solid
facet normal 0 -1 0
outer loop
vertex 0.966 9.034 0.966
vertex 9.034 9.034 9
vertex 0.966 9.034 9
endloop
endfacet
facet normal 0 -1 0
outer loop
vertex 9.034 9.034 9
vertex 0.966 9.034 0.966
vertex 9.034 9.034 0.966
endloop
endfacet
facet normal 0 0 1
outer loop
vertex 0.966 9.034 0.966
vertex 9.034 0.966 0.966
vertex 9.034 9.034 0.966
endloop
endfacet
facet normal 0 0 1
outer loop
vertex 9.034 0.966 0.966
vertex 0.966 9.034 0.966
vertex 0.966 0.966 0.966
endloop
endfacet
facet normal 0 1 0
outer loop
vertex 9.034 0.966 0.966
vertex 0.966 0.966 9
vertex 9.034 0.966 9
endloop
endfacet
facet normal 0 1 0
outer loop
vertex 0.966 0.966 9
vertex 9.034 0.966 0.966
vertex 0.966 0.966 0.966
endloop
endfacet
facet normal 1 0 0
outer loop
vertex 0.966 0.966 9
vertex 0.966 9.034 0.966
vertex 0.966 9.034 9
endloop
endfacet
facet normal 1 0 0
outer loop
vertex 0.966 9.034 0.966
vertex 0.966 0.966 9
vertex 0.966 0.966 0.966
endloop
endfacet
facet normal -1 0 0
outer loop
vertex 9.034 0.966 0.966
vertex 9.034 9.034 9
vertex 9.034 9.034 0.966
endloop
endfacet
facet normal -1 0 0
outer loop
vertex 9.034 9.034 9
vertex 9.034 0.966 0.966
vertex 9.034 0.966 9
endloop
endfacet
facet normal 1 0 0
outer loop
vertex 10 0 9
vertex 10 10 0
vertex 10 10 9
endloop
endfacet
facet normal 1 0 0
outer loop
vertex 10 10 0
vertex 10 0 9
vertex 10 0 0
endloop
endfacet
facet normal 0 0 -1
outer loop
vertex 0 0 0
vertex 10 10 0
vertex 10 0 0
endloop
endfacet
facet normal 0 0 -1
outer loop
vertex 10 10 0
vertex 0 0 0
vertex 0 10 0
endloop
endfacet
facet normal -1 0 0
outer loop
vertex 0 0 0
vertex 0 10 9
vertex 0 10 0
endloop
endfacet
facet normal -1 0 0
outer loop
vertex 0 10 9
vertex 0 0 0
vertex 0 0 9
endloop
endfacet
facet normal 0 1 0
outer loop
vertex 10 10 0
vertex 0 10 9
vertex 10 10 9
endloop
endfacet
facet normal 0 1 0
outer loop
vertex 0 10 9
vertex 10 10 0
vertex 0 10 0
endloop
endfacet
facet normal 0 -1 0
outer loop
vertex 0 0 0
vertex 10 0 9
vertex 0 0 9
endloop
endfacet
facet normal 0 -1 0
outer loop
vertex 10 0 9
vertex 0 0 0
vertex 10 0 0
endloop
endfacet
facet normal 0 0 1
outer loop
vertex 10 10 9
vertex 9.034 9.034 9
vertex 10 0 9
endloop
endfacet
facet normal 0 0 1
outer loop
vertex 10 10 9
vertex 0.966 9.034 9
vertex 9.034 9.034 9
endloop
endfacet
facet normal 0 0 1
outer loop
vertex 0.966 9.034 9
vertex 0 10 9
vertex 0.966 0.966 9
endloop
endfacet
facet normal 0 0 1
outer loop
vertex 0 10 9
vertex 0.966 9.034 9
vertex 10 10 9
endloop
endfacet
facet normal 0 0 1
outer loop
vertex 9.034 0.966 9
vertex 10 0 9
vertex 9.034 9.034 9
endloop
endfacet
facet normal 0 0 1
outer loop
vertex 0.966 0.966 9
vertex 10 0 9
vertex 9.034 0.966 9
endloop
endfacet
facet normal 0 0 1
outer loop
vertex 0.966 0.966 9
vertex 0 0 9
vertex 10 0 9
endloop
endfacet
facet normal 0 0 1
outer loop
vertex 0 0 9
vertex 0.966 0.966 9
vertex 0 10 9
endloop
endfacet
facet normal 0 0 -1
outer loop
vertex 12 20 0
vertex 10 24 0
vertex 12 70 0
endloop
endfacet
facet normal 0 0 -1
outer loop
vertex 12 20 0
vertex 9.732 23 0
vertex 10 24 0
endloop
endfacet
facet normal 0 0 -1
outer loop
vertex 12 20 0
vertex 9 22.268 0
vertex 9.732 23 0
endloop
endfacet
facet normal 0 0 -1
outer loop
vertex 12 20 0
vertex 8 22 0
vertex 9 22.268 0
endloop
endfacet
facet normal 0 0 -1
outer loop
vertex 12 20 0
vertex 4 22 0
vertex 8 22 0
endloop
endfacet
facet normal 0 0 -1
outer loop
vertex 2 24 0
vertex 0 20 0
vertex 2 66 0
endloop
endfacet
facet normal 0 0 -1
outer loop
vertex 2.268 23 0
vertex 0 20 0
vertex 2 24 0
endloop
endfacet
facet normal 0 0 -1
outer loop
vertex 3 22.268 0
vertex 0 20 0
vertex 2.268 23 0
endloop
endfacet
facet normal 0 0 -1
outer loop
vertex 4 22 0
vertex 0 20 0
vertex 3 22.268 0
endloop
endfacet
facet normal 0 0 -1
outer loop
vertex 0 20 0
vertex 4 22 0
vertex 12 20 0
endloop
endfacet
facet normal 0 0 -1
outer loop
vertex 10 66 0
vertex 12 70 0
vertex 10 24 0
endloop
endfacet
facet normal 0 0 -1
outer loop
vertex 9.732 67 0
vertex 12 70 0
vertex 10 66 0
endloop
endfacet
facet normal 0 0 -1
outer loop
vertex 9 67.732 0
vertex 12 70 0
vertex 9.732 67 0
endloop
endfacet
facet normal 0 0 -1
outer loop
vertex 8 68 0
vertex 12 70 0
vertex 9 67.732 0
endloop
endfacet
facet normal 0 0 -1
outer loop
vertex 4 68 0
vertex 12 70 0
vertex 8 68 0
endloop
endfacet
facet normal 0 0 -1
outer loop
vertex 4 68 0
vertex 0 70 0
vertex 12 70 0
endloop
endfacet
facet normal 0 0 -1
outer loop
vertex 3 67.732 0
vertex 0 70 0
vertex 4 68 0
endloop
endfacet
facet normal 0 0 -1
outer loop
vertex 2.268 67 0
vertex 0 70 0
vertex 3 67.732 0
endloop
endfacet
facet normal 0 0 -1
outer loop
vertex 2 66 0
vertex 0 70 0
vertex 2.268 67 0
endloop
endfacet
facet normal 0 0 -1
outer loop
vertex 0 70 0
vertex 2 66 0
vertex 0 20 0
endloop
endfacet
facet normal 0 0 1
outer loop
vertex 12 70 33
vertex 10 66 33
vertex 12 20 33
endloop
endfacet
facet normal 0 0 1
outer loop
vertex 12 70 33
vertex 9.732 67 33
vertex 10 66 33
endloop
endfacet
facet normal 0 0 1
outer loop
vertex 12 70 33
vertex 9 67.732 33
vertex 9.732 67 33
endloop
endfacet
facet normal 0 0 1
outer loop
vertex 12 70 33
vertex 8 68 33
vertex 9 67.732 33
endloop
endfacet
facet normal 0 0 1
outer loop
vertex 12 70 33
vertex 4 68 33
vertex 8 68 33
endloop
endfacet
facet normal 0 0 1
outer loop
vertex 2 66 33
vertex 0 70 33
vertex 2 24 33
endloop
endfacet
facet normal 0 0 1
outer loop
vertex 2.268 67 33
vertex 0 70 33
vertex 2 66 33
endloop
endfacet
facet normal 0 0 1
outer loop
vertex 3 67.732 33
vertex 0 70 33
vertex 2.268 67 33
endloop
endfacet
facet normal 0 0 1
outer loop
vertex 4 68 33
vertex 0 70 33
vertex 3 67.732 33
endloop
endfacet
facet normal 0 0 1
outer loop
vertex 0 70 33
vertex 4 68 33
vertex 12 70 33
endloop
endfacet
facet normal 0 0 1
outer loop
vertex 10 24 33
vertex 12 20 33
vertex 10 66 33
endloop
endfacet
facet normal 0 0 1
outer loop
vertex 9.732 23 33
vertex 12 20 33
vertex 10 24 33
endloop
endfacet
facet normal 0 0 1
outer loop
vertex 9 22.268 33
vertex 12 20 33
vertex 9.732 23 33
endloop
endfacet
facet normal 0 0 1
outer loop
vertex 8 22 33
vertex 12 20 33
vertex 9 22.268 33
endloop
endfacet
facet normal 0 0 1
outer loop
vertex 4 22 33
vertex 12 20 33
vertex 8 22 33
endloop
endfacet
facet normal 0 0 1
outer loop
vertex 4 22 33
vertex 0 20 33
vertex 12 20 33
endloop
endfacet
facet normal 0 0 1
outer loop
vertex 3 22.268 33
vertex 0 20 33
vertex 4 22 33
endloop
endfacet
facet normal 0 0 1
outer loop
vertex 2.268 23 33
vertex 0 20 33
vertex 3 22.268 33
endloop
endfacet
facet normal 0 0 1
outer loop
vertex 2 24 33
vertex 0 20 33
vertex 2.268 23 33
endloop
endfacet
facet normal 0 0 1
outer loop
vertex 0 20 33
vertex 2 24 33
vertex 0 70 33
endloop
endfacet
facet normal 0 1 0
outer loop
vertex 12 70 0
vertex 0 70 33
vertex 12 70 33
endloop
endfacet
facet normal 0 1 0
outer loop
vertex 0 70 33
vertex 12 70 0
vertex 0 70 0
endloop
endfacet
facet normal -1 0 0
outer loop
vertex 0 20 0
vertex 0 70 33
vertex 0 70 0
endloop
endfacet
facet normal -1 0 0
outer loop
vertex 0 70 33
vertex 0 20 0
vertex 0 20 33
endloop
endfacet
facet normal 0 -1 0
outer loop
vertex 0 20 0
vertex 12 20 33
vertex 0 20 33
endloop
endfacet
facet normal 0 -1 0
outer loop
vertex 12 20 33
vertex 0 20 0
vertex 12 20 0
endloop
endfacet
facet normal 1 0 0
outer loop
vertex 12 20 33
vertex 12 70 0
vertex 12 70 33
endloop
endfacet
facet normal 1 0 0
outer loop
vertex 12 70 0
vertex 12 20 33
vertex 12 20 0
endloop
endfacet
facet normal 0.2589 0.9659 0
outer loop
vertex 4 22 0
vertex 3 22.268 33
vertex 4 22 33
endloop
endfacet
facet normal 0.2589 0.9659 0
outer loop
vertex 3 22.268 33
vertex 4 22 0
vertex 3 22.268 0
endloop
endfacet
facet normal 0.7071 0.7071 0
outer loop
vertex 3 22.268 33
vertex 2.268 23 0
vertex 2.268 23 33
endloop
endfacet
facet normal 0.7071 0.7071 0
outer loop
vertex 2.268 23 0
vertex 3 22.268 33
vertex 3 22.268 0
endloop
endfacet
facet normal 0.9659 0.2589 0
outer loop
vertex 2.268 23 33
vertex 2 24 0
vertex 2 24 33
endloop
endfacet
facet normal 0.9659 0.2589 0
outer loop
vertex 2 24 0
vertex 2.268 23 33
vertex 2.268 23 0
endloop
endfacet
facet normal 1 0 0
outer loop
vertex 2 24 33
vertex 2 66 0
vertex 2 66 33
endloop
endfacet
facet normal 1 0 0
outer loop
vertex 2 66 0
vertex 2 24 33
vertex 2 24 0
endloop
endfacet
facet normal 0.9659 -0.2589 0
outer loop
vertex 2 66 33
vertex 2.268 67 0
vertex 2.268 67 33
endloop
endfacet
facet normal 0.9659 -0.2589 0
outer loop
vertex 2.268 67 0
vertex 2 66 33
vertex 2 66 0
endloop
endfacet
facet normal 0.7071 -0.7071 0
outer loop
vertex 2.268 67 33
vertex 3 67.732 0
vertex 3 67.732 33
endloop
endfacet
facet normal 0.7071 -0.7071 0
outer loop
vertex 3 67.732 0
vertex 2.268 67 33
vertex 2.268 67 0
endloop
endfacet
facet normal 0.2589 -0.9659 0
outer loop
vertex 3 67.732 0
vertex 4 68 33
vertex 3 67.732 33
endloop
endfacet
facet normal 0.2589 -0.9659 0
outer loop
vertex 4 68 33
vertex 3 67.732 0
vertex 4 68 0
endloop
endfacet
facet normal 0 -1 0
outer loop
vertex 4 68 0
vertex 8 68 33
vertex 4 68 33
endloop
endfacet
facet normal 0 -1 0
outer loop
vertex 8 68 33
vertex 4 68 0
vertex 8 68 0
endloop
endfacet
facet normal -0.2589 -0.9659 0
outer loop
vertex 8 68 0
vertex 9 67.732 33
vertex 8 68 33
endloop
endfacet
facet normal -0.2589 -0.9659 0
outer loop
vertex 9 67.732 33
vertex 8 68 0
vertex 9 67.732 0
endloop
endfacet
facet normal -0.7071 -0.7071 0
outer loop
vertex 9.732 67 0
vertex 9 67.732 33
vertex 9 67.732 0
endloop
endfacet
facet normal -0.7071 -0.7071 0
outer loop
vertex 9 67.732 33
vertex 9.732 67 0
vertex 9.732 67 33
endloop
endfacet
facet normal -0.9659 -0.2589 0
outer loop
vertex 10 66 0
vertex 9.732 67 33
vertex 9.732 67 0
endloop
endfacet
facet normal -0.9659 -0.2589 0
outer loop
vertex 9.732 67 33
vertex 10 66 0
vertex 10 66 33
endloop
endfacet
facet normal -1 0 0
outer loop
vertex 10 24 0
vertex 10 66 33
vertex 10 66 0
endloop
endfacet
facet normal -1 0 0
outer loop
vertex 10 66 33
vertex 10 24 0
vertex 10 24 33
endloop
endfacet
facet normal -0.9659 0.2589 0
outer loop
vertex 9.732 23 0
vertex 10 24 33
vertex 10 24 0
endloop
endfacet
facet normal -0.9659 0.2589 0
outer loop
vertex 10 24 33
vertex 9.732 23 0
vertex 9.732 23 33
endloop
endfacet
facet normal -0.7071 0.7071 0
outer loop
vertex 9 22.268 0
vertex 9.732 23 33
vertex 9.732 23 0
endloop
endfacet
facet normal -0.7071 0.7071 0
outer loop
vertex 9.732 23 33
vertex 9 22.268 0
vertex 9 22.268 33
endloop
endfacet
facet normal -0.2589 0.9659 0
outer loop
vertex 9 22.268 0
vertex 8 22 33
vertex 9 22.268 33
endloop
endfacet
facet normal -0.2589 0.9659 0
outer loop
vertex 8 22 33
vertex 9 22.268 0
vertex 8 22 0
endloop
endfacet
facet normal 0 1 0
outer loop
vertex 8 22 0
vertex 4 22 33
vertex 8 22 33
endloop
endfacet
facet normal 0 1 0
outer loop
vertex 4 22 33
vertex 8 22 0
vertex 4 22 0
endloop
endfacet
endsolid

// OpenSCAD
module shrink(offset=1,$fn=12,range=400,dimension=3) {
    
    module c() {
        if (dimension<3) {
            square(size=2*range, center=true);
        }
        else {
            cube(size=2*range, center=true);
        }
    }

    render(convexity=12)    
    difference() {
        c();
        minkowski() {
            difference() {
                c();
                children();
            }
            if (dimension<3)
                circle(r=offset, $fn=$fn);
            else
                sphere(r=offset, $fn=$fn);
        }
    }
}

module hollow(offset=1,$fn=12,range=400,rounded=false,dimension=3) {
    render(convexity=24)
    difference() {
        children();
        if (rounded) {
            minkowski() {
                shrink(offset=offset*2,$fn=$fn,range=range,dimension=dimension) children();
                if(dimension<3) circle(r=offset,$fn=$fn);
                     else
                sphere(r=offset,$fn=$fn);
            }
        }
        else{
            shrink(offset=offset,$fn=$fn,range=range,dimension=dimension) children();
        }
    }
}

difference() {
    hollow(rounded=false) cube([10,10,10]);
    translate([0,0,9]) cube([10,10,1]);
}

translate([0,20,0]) linear_extrude(height=33) hollow(dimension=2,rounded=true,offset=2) square([12,50]);
